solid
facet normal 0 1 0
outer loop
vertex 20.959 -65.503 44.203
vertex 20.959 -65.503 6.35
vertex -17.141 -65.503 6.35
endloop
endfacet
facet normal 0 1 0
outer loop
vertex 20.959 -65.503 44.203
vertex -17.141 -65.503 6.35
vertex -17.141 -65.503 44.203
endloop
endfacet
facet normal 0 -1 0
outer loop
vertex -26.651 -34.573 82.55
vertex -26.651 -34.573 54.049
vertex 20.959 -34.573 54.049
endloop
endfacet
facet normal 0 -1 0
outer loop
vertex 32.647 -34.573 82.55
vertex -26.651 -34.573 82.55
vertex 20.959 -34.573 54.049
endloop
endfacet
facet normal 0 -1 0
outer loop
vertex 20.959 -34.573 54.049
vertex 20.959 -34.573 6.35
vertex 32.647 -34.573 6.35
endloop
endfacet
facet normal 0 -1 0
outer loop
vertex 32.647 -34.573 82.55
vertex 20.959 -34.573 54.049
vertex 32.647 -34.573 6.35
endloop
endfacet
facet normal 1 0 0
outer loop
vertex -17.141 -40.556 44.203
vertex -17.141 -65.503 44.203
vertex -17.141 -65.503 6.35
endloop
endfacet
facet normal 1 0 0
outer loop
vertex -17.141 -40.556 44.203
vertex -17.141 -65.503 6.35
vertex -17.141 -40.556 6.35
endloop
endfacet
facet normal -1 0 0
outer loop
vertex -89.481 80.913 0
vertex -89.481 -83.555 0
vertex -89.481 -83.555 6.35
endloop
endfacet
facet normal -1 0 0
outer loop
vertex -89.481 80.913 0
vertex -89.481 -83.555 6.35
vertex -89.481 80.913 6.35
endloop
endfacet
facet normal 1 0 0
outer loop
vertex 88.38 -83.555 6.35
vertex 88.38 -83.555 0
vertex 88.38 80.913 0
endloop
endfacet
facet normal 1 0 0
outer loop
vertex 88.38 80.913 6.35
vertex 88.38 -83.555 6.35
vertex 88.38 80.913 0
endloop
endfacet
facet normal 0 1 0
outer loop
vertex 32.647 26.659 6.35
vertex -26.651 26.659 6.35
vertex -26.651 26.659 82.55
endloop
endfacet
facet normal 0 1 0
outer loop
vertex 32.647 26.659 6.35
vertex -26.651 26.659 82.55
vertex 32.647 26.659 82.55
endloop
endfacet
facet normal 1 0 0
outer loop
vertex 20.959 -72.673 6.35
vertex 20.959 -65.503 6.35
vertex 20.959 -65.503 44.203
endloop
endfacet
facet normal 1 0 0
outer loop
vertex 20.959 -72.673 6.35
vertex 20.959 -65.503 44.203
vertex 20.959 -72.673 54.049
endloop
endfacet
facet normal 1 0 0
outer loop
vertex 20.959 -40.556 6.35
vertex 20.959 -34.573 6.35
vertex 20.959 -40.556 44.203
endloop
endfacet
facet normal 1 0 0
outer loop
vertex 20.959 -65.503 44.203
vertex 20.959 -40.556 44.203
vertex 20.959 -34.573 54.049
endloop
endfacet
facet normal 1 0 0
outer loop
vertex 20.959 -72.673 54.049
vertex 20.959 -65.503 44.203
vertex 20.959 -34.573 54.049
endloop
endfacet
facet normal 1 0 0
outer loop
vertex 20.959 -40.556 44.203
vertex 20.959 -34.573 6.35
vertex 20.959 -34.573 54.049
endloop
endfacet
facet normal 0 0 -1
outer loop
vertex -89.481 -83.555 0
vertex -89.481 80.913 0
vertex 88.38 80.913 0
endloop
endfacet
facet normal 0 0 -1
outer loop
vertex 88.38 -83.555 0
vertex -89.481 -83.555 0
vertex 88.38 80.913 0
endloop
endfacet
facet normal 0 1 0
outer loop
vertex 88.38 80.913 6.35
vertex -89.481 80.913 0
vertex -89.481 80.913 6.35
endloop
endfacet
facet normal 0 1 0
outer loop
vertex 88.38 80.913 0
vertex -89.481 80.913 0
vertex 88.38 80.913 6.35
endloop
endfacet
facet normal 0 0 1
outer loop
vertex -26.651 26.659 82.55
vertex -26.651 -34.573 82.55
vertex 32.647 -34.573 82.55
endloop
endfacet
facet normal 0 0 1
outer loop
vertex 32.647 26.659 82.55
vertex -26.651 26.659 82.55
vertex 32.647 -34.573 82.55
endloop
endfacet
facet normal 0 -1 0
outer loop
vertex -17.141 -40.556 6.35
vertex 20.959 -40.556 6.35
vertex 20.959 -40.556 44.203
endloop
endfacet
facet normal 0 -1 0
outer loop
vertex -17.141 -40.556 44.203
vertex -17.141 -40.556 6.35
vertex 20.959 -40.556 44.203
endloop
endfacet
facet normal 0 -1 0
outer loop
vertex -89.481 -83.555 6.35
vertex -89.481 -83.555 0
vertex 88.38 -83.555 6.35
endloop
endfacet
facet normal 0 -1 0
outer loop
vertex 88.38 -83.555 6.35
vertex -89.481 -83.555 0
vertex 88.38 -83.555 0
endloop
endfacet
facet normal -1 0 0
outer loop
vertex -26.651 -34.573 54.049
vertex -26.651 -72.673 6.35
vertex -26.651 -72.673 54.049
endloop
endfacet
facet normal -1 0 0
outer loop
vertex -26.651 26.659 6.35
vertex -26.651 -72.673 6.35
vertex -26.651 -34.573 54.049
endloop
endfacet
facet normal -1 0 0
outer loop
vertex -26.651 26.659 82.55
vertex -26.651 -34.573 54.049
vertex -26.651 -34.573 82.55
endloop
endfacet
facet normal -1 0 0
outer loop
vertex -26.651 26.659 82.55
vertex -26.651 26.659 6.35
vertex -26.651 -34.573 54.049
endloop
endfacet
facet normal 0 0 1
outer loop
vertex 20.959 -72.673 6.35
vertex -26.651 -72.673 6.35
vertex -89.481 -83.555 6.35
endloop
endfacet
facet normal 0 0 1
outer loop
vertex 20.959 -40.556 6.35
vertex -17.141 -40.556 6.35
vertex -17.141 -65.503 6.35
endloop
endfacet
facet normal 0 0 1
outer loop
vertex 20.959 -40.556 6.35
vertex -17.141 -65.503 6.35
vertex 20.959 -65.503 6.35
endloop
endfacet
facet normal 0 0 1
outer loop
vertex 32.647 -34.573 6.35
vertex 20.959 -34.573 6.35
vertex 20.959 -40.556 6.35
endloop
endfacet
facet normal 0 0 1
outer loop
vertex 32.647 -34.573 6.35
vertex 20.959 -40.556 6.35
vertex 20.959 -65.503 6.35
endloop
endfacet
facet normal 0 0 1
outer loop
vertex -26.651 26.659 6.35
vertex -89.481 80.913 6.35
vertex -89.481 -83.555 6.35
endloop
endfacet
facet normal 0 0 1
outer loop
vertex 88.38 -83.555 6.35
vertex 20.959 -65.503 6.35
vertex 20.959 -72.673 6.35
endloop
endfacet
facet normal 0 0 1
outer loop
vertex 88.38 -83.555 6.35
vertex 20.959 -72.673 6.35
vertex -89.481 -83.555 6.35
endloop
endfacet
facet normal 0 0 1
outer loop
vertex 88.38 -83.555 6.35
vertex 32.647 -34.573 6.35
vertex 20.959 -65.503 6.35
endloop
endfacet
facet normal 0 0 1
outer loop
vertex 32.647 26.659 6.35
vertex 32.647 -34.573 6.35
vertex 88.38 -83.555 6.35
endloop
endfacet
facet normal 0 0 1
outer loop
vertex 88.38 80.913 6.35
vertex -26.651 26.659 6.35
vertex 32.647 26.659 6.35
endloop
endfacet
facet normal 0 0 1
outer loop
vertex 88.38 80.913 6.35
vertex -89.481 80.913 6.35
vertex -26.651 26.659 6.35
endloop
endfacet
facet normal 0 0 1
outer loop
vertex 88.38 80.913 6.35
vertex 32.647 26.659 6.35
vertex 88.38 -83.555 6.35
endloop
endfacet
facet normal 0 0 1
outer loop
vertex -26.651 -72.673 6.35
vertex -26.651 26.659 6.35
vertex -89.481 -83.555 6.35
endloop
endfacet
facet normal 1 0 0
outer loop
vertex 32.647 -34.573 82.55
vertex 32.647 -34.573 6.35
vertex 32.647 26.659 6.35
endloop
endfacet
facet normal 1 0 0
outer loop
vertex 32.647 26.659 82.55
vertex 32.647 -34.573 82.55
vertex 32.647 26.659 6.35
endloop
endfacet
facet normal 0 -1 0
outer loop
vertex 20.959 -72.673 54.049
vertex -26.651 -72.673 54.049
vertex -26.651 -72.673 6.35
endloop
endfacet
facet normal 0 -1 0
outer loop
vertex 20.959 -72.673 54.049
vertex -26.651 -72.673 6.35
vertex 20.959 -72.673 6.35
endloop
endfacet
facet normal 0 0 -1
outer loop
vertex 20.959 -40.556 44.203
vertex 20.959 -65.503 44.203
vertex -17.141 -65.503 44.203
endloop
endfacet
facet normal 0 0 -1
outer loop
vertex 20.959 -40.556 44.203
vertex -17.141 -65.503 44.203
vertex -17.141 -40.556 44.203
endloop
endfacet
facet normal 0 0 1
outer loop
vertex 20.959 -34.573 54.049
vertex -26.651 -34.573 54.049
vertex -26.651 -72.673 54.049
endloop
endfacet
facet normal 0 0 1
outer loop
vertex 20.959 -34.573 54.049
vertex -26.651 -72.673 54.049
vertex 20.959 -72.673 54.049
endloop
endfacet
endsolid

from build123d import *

# Parameters (mm, degrees)
F0_W     = 177.861019969
F0_H     = 164.4679009914
F1_DEPTH = 6.35
F2_W     = 59.2979416251
F2_H     = 61.2313710153
F3_DEPTH = 76.2
F4_W     = 47.6095601916
F4_H     = 47.6991081774
F5_DEPTH = 38.1
F6_W     = 24.9475054443
F6_H     = 37.8527449608
F7_DEPTH = 38.1


with BuildPart() as f1:
    # F0 (on Top) → F1 (new body)
    with BuildSketch(Plane.XY):
        with Locations((-0.550635159, -1.3211369514)):
            Rectangle(F0_W, F0_H)
    extrude(amount=F1_DEPTH)

    # F2 (on face) → F3 (join)
    with BuildSketch(Plane.XY.offset(6.35)):
        with Locations((2.9982812703, -3.9570573717)):
            Rectangle(F2_W, F2_H)
    extrude(amount=F3_DEPTH)

    # F4 (on face) → F5 (join)
    with BuildSketch(Plane.XZ.offset(34.5727428794)):
        with Locations((-2.8459094465, 30.1995540887)):
            Rectangle(F4_W, F4_H)
    extrude(amount=F5_DEPTH)

    # F6 (on face) → F7 (cut)
    with BuildSketch(Plane.YZ.offset(20.9588706493)):
        with Locations((-53.0296508223, 25.2763724804)):
            Rectangle(F6_W, F6_H)
    extrude(amount=-F7_DEPTH, mode=Mode.SUBTRACT)


solid = f1.part
